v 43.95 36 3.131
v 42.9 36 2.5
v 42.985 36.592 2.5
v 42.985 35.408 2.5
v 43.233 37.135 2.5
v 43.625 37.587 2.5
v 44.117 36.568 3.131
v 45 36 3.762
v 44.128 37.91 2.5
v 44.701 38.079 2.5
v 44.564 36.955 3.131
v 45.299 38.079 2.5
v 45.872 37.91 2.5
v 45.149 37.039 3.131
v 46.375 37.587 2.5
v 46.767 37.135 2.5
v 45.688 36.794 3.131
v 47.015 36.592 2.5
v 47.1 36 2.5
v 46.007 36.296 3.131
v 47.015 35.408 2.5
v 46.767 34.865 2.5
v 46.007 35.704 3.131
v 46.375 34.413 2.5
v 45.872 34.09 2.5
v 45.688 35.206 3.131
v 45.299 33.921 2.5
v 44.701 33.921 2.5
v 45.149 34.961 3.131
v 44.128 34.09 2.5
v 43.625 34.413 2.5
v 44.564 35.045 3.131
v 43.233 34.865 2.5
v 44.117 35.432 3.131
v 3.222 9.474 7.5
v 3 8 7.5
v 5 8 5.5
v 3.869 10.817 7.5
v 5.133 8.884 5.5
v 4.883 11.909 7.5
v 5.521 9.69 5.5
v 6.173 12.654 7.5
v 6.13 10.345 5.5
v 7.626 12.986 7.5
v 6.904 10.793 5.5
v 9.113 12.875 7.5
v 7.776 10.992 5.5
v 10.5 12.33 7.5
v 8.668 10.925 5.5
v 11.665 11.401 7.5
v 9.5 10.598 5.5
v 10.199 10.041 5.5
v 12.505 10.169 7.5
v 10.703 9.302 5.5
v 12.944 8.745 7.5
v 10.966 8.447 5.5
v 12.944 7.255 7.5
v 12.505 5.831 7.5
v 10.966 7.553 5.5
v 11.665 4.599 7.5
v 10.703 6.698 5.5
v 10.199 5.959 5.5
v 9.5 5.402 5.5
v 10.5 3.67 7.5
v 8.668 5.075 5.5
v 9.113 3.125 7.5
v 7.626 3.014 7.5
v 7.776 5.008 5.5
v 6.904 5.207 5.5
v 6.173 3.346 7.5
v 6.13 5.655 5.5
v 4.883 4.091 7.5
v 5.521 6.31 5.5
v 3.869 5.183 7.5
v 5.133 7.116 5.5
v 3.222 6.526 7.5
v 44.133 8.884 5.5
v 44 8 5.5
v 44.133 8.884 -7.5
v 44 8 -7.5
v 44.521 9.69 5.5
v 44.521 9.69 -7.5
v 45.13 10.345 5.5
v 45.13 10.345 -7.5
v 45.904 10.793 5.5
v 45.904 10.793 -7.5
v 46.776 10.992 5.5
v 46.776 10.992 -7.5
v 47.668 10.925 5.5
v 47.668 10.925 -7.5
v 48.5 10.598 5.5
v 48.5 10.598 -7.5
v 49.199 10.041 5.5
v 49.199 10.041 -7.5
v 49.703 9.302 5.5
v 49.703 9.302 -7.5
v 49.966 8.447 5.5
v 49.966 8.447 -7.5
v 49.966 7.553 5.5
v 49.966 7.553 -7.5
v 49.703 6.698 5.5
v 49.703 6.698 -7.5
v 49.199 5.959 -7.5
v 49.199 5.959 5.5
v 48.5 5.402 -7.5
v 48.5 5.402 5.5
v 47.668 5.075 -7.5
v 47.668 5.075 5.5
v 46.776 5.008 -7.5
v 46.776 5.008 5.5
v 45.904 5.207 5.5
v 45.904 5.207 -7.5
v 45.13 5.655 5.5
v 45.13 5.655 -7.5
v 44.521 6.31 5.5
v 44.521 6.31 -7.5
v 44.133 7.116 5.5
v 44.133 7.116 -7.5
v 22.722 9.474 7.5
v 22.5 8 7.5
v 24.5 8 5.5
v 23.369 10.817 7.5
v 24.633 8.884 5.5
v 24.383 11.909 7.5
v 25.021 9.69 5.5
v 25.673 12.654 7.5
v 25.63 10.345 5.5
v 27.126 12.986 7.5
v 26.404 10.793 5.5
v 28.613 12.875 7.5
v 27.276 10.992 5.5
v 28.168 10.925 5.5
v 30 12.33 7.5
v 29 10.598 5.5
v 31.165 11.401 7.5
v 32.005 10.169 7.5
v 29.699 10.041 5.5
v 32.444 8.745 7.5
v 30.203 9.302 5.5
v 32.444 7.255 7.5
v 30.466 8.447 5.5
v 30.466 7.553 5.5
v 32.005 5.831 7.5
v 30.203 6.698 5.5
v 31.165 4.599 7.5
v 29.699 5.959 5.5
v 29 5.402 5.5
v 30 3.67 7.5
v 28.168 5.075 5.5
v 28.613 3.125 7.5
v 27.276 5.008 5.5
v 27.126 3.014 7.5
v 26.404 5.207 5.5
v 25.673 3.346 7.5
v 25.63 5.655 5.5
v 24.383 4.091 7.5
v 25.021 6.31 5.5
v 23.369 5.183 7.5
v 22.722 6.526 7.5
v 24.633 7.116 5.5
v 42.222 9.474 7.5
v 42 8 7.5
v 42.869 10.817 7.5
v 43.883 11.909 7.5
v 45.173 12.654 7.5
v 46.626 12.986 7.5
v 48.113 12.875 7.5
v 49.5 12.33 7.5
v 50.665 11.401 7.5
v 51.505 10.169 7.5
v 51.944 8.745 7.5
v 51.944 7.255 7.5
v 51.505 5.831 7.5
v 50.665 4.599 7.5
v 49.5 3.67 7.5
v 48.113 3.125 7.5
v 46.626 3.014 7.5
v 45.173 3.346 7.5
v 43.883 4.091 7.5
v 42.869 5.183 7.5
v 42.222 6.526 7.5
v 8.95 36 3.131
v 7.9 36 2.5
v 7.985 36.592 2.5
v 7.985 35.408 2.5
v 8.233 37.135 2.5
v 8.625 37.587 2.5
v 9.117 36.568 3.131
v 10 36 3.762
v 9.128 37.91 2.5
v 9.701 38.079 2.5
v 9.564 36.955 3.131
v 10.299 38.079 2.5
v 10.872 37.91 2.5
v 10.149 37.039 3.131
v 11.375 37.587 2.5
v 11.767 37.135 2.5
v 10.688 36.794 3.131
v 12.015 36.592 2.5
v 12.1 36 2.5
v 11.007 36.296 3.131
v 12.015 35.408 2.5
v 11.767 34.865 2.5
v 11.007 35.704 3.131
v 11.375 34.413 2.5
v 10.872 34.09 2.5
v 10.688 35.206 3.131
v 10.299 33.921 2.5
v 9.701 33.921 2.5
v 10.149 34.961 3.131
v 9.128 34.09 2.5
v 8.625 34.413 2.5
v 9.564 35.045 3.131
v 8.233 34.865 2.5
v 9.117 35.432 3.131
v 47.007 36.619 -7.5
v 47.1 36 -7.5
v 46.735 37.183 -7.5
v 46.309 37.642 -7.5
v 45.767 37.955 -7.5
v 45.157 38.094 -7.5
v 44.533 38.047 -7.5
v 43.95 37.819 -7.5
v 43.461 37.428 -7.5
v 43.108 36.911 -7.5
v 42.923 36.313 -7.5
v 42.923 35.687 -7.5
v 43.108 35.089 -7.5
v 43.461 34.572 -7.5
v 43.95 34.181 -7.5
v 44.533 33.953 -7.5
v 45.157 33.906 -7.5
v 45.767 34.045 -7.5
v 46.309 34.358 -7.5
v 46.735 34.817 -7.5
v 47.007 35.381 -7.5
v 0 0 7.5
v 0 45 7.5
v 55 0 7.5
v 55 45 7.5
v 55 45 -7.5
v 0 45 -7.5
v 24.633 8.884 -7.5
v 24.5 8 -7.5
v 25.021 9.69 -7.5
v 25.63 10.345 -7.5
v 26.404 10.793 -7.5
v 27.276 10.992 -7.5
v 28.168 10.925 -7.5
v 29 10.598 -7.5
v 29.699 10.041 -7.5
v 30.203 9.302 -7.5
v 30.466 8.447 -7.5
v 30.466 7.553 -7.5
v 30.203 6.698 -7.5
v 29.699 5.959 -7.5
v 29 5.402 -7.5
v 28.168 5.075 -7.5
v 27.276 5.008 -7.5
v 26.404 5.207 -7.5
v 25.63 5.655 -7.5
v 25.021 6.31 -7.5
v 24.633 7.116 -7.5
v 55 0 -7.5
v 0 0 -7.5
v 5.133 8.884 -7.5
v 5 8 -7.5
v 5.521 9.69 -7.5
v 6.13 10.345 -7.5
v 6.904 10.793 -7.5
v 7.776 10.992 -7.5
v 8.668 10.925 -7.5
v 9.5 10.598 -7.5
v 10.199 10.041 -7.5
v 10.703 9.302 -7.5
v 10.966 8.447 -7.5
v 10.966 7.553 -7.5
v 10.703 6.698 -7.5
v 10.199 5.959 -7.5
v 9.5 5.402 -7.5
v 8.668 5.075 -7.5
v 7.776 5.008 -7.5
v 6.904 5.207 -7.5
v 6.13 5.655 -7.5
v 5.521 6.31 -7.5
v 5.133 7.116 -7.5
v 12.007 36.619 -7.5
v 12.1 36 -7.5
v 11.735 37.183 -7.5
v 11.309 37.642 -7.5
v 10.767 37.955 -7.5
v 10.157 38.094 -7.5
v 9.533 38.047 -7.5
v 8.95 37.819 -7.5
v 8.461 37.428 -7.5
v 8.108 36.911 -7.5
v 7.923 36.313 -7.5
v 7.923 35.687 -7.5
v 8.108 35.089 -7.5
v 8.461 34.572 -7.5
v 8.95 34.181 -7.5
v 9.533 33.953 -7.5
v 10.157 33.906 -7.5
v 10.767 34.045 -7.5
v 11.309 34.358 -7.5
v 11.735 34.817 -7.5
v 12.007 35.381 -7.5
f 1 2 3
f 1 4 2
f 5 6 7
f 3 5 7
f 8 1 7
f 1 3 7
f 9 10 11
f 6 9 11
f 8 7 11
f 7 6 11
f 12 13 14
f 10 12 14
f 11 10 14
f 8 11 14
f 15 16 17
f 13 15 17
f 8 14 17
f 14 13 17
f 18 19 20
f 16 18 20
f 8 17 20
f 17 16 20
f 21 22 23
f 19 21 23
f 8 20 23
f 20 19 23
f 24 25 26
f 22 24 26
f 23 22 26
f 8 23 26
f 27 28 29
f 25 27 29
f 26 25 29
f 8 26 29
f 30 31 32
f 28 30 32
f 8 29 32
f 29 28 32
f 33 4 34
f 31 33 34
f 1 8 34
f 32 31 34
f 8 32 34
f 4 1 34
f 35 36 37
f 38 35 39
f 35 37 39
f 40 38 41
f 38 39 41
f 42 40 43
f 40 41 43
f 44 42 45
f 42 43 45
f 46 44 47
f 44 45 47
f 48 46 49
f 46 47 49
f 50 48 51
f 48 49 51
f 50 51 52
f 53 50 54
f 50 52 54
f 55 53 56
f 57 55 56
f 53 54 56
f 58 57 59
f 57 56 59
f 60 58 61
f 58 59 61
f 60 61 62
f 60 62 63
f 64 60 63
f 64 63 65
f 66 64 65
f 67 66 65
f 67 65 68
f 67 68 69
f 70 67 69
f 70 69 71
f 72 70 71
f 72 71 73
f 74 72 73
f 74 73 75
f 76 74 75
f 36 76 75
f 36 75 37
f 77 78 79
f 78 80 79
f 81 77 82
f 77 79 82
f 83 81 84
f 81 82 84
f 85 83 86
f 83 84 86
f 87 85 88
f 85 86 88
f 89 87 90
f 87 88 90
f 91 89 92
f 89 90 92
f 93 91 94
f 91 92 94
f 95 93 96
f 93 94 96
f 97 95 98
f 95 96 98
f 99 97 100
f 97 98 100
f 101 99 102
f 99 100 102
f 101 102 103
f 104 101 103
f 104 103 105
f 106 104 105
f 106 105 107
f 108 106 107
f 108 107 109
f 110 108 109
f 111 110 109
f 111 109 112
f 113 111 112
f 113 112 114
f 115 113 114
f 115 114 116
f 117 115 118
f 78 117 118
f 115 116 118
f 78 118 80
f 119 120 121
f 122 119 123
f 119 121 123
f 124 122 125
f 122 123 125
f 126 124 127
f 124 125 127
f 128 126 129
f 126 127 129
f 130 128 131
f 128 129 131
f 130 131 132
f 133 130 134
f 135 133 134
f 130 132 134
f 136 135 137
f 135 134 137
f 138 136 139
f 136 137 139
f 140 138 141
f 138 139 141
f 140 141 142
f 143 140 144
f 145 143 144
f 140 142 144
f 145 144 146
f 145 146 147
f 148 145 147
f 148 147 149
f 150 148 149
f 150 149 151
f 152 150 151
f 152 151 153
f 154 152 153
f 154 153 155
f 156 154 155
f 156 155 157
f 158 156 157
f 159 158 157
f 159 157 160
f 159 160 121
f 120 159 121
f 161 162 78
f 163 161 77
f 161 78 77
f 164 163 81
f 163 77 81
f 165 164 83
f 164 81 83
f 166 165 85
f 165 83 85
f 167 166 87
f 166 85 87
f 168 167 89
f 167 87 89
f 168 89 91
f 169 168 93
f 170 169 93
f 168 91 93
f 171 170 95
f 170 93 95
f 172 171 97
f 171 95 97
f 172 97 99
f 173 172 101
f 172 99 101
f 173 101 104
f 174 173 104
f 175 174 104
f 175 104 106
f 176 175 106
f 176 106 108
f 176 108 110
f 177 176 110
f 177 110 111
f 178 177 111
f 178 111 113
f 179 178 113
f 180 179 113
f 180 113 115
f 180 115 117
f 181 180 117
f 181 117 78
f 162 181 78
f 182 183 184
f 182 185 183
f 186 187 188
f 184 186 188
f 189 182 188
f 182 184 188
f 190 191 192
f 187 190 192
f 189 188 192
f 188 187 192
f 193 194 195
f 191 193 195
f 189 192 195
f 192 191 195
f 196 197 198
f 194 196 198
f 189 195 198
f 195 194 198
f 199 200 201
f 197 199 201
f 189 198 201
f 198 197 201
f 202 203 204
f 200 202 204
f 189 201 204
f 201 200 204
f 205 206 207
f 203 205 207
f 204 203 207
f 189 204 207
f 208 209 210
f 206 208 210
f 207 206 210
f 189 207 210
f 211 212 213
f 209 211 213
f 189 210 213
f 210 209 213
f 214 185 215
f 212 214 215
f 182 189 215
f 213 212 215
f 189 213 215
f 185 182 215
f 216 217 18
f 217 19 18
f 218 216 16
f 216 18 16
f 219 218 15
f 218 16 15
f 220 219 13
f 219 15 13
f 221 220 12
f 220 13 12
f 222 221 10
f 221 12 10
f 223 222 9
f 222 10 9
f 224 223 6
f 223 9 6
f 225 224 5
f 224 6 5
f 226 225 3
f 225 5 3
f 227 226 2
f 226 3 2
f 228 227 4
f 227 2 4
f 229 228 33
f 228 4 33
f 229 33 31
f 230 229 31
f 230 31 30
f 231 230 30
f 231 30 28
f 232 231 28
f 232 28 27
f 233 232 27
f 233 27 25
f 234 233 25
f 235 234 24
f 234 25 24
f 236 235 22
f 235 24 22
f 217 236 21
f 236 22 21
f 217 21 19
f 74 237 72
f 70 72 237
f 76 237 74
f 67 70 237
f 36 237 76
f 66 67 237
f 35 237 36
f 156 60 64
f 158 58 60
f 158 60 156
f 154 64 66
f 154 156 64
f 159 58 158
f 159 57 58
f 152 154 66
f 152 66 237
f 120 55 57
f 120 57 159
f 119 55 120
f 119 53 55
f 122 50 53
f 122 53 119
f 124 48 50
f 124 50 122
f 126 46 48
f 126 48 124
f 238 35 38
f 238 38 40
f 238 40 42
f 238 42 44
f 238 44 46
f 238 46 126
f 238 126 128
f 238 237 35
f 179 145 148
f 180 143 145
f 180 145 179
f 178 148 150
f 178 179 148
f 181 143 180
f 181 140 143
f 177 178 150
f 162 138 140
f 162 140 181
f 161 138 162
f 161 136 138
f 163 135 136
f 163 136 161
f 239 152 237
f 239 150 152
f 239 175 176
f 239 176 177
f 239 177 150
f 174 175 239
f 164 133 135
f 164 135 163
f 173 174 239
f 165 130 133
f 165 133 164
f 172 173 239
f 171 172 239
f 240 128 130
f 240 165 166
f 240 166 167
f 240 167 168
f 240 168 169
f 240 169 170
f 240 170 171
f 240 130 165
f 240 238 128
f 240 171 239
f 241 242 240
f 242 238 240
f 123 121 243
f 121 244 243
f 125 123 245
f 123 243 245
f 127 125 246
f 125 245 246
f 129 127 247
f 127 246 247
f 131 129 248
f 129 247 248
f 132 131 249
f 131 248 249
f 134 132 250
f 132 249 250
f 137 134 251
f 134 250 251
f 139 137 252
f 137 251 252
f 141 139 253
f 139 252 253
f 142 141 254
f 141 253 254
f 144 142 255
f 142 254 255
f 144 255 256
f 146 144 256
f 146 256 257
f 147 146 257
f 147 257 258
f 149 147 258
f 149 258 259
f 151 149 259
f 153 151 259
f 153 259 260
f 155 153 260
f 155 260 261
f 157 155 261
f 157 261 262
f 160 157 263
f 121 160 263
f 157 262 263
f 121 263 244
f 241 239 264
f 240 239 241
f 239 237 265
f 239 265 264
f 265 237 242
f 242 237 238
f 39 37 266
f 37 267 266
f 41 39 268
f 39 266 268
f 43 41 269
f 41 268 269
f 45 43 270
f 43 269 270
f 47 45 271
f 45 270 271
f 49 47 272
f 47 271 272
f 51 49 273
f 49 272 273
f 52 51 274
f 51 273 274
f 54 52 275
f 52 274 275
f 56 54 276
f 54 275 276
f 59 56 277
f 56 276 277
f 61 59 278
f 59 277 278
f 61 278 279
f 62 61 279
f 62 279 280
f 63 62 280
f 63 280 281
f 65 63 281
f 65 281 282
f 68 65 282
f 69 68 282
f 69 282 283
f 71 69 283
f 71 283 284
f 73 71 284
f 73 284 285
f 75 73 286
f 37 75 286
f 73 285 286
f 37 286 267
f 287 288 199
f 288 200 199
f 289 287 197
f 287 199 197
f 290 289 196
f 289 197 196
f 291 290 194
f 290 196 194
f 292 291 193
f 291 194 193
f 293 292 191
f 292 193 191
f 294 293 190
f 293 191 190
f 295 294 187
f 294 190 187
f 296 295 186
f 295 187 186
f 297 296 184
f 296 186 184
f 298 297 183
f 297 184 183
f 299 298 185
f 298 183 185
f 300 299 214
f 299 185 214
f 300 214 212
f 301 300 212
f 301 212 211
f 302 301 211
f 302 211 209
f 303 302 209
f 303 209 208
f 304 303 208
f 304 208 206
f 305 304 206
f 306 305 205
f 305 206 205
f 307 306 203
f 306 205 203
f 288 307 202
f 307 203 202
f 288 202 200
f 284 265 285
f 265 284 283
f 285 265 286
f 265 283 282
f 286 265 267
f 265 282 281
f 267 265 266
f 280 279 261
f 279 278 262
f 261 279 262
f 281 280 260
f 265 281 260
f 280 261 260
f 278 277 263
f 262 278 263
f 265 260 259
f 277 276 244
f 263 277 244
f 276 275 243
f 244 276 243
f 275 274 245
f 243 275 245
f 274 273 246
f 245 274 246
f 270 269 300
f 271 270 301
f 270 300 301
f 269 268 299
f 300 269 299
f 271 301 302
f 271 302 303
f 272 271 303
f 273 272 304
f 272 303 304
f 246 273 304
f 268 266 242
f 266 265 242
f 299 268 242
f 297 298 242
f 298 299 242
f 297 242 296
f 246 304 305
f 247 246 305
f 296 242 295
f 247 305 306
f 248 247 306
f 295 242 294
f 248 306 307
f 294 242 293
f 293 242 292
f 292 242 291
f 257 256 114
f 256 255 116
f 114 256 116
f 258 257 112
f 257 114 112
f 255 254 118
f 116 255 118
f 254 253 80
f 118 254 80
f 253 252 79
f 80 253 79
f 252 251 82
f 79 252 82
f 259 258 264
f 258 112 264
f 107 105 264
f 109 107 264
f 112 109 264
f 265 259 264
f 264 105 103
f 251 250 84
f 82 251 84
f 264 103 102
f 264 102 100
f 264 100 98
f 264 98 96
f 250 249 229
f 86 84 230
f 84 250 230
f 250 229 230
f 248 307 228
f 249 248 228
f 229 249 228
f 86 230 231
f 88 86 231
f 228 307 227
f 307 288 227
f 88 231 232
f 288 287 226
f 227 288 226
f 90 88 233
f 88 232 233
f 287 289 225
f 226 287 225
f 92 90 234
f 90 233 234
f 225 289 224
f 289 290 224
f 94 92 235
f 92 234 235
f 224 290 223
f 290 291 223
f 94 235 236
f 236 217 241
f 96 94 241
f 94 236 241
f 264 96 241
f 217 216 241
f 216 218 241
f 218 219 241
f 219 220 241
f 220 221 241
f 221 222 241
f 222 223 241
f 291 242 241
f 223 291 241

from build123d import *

# Parameters (mm, degrees)
SKETCH1_W                       = 55
SKETCH1_H                       = 45
BOSS_EXTRUDE1_DEPTH             = 7.5
F_6_0MM_DOWEL_HOLE1_D           = 6
F_6_0MM_DOWEL_HOLE1_CSINK_D     = 10
F_6_0MM_DOWEL_HOLE1_CSINK_ANGLE = 90
TAP_DRILL_FOR_M5X0_8_TAP2_D     = 4.2
TAP_DRILL_FOR_M5X0_8_TAP2_DEPTH = 10
TAP_DRILL_FOR_M5X0_8_TAP2_TIP   = 1.2618073


with BuildPart() as part:
    # Sketch1 → Boss-Extrude1 (new body, symmetric)
    with BuildSketch(Plane.XY):
        with Locations((27.5, 22.5)):
            Rectangle(SKETCH1_W, SKETCH1_H)
    extrude(amount=BOSS_EXTRUDE1_DEPTH, both=True)

    # Ø6.0mm Dowel Hole1 (through all)
    with Locations(Plane(origin=(8, 8, 7.5), x_dir=(1, 0, 0), z_dir=(0, 0, 1))):
        with Locations((0, 0), (19.5, 0), (39, 0)):
            CounterSinkHole(F_6_0MM_DOWEL_HOLE1_D / 2, F_6_0MM_DOWEL_HOLE1_CSINK_D / 2, counter_sink_angle=F_6_0MM_DOWEL_HOLE1_CSINK_ANGLE)

    # Tap Drill for M5x0.8 Tap2
    with Locations(Plane(origin=(45, 36, -7.5), x_dir=(-1, 0, 0), z_dir=(0, 0, -1))):
        with Locations((0, 0), (35, 0)):
            Hole(TAP_DRILL_FOR_M5X0_8_TAP2_D / 2, depth=TAP_DRILL_FOR_M5X0_8_TAP2_DEPTH)
            with Locations((0, 0, -(TAP_DRILL_FOR_M5X0_8_TAP2_DEPTH + TAP_DRILL_FOR_M5X0_8_TAP2_TIP / 2))):  # 118° drill point
                Cone(0, TAP_DRILL_FOR_M5X0_8_TAP2_D / 2, TAP_DRILL_FOR_M5X0_8_TAP2_TIP, mode=Mode.SUBTRACT)


solid = part.part
